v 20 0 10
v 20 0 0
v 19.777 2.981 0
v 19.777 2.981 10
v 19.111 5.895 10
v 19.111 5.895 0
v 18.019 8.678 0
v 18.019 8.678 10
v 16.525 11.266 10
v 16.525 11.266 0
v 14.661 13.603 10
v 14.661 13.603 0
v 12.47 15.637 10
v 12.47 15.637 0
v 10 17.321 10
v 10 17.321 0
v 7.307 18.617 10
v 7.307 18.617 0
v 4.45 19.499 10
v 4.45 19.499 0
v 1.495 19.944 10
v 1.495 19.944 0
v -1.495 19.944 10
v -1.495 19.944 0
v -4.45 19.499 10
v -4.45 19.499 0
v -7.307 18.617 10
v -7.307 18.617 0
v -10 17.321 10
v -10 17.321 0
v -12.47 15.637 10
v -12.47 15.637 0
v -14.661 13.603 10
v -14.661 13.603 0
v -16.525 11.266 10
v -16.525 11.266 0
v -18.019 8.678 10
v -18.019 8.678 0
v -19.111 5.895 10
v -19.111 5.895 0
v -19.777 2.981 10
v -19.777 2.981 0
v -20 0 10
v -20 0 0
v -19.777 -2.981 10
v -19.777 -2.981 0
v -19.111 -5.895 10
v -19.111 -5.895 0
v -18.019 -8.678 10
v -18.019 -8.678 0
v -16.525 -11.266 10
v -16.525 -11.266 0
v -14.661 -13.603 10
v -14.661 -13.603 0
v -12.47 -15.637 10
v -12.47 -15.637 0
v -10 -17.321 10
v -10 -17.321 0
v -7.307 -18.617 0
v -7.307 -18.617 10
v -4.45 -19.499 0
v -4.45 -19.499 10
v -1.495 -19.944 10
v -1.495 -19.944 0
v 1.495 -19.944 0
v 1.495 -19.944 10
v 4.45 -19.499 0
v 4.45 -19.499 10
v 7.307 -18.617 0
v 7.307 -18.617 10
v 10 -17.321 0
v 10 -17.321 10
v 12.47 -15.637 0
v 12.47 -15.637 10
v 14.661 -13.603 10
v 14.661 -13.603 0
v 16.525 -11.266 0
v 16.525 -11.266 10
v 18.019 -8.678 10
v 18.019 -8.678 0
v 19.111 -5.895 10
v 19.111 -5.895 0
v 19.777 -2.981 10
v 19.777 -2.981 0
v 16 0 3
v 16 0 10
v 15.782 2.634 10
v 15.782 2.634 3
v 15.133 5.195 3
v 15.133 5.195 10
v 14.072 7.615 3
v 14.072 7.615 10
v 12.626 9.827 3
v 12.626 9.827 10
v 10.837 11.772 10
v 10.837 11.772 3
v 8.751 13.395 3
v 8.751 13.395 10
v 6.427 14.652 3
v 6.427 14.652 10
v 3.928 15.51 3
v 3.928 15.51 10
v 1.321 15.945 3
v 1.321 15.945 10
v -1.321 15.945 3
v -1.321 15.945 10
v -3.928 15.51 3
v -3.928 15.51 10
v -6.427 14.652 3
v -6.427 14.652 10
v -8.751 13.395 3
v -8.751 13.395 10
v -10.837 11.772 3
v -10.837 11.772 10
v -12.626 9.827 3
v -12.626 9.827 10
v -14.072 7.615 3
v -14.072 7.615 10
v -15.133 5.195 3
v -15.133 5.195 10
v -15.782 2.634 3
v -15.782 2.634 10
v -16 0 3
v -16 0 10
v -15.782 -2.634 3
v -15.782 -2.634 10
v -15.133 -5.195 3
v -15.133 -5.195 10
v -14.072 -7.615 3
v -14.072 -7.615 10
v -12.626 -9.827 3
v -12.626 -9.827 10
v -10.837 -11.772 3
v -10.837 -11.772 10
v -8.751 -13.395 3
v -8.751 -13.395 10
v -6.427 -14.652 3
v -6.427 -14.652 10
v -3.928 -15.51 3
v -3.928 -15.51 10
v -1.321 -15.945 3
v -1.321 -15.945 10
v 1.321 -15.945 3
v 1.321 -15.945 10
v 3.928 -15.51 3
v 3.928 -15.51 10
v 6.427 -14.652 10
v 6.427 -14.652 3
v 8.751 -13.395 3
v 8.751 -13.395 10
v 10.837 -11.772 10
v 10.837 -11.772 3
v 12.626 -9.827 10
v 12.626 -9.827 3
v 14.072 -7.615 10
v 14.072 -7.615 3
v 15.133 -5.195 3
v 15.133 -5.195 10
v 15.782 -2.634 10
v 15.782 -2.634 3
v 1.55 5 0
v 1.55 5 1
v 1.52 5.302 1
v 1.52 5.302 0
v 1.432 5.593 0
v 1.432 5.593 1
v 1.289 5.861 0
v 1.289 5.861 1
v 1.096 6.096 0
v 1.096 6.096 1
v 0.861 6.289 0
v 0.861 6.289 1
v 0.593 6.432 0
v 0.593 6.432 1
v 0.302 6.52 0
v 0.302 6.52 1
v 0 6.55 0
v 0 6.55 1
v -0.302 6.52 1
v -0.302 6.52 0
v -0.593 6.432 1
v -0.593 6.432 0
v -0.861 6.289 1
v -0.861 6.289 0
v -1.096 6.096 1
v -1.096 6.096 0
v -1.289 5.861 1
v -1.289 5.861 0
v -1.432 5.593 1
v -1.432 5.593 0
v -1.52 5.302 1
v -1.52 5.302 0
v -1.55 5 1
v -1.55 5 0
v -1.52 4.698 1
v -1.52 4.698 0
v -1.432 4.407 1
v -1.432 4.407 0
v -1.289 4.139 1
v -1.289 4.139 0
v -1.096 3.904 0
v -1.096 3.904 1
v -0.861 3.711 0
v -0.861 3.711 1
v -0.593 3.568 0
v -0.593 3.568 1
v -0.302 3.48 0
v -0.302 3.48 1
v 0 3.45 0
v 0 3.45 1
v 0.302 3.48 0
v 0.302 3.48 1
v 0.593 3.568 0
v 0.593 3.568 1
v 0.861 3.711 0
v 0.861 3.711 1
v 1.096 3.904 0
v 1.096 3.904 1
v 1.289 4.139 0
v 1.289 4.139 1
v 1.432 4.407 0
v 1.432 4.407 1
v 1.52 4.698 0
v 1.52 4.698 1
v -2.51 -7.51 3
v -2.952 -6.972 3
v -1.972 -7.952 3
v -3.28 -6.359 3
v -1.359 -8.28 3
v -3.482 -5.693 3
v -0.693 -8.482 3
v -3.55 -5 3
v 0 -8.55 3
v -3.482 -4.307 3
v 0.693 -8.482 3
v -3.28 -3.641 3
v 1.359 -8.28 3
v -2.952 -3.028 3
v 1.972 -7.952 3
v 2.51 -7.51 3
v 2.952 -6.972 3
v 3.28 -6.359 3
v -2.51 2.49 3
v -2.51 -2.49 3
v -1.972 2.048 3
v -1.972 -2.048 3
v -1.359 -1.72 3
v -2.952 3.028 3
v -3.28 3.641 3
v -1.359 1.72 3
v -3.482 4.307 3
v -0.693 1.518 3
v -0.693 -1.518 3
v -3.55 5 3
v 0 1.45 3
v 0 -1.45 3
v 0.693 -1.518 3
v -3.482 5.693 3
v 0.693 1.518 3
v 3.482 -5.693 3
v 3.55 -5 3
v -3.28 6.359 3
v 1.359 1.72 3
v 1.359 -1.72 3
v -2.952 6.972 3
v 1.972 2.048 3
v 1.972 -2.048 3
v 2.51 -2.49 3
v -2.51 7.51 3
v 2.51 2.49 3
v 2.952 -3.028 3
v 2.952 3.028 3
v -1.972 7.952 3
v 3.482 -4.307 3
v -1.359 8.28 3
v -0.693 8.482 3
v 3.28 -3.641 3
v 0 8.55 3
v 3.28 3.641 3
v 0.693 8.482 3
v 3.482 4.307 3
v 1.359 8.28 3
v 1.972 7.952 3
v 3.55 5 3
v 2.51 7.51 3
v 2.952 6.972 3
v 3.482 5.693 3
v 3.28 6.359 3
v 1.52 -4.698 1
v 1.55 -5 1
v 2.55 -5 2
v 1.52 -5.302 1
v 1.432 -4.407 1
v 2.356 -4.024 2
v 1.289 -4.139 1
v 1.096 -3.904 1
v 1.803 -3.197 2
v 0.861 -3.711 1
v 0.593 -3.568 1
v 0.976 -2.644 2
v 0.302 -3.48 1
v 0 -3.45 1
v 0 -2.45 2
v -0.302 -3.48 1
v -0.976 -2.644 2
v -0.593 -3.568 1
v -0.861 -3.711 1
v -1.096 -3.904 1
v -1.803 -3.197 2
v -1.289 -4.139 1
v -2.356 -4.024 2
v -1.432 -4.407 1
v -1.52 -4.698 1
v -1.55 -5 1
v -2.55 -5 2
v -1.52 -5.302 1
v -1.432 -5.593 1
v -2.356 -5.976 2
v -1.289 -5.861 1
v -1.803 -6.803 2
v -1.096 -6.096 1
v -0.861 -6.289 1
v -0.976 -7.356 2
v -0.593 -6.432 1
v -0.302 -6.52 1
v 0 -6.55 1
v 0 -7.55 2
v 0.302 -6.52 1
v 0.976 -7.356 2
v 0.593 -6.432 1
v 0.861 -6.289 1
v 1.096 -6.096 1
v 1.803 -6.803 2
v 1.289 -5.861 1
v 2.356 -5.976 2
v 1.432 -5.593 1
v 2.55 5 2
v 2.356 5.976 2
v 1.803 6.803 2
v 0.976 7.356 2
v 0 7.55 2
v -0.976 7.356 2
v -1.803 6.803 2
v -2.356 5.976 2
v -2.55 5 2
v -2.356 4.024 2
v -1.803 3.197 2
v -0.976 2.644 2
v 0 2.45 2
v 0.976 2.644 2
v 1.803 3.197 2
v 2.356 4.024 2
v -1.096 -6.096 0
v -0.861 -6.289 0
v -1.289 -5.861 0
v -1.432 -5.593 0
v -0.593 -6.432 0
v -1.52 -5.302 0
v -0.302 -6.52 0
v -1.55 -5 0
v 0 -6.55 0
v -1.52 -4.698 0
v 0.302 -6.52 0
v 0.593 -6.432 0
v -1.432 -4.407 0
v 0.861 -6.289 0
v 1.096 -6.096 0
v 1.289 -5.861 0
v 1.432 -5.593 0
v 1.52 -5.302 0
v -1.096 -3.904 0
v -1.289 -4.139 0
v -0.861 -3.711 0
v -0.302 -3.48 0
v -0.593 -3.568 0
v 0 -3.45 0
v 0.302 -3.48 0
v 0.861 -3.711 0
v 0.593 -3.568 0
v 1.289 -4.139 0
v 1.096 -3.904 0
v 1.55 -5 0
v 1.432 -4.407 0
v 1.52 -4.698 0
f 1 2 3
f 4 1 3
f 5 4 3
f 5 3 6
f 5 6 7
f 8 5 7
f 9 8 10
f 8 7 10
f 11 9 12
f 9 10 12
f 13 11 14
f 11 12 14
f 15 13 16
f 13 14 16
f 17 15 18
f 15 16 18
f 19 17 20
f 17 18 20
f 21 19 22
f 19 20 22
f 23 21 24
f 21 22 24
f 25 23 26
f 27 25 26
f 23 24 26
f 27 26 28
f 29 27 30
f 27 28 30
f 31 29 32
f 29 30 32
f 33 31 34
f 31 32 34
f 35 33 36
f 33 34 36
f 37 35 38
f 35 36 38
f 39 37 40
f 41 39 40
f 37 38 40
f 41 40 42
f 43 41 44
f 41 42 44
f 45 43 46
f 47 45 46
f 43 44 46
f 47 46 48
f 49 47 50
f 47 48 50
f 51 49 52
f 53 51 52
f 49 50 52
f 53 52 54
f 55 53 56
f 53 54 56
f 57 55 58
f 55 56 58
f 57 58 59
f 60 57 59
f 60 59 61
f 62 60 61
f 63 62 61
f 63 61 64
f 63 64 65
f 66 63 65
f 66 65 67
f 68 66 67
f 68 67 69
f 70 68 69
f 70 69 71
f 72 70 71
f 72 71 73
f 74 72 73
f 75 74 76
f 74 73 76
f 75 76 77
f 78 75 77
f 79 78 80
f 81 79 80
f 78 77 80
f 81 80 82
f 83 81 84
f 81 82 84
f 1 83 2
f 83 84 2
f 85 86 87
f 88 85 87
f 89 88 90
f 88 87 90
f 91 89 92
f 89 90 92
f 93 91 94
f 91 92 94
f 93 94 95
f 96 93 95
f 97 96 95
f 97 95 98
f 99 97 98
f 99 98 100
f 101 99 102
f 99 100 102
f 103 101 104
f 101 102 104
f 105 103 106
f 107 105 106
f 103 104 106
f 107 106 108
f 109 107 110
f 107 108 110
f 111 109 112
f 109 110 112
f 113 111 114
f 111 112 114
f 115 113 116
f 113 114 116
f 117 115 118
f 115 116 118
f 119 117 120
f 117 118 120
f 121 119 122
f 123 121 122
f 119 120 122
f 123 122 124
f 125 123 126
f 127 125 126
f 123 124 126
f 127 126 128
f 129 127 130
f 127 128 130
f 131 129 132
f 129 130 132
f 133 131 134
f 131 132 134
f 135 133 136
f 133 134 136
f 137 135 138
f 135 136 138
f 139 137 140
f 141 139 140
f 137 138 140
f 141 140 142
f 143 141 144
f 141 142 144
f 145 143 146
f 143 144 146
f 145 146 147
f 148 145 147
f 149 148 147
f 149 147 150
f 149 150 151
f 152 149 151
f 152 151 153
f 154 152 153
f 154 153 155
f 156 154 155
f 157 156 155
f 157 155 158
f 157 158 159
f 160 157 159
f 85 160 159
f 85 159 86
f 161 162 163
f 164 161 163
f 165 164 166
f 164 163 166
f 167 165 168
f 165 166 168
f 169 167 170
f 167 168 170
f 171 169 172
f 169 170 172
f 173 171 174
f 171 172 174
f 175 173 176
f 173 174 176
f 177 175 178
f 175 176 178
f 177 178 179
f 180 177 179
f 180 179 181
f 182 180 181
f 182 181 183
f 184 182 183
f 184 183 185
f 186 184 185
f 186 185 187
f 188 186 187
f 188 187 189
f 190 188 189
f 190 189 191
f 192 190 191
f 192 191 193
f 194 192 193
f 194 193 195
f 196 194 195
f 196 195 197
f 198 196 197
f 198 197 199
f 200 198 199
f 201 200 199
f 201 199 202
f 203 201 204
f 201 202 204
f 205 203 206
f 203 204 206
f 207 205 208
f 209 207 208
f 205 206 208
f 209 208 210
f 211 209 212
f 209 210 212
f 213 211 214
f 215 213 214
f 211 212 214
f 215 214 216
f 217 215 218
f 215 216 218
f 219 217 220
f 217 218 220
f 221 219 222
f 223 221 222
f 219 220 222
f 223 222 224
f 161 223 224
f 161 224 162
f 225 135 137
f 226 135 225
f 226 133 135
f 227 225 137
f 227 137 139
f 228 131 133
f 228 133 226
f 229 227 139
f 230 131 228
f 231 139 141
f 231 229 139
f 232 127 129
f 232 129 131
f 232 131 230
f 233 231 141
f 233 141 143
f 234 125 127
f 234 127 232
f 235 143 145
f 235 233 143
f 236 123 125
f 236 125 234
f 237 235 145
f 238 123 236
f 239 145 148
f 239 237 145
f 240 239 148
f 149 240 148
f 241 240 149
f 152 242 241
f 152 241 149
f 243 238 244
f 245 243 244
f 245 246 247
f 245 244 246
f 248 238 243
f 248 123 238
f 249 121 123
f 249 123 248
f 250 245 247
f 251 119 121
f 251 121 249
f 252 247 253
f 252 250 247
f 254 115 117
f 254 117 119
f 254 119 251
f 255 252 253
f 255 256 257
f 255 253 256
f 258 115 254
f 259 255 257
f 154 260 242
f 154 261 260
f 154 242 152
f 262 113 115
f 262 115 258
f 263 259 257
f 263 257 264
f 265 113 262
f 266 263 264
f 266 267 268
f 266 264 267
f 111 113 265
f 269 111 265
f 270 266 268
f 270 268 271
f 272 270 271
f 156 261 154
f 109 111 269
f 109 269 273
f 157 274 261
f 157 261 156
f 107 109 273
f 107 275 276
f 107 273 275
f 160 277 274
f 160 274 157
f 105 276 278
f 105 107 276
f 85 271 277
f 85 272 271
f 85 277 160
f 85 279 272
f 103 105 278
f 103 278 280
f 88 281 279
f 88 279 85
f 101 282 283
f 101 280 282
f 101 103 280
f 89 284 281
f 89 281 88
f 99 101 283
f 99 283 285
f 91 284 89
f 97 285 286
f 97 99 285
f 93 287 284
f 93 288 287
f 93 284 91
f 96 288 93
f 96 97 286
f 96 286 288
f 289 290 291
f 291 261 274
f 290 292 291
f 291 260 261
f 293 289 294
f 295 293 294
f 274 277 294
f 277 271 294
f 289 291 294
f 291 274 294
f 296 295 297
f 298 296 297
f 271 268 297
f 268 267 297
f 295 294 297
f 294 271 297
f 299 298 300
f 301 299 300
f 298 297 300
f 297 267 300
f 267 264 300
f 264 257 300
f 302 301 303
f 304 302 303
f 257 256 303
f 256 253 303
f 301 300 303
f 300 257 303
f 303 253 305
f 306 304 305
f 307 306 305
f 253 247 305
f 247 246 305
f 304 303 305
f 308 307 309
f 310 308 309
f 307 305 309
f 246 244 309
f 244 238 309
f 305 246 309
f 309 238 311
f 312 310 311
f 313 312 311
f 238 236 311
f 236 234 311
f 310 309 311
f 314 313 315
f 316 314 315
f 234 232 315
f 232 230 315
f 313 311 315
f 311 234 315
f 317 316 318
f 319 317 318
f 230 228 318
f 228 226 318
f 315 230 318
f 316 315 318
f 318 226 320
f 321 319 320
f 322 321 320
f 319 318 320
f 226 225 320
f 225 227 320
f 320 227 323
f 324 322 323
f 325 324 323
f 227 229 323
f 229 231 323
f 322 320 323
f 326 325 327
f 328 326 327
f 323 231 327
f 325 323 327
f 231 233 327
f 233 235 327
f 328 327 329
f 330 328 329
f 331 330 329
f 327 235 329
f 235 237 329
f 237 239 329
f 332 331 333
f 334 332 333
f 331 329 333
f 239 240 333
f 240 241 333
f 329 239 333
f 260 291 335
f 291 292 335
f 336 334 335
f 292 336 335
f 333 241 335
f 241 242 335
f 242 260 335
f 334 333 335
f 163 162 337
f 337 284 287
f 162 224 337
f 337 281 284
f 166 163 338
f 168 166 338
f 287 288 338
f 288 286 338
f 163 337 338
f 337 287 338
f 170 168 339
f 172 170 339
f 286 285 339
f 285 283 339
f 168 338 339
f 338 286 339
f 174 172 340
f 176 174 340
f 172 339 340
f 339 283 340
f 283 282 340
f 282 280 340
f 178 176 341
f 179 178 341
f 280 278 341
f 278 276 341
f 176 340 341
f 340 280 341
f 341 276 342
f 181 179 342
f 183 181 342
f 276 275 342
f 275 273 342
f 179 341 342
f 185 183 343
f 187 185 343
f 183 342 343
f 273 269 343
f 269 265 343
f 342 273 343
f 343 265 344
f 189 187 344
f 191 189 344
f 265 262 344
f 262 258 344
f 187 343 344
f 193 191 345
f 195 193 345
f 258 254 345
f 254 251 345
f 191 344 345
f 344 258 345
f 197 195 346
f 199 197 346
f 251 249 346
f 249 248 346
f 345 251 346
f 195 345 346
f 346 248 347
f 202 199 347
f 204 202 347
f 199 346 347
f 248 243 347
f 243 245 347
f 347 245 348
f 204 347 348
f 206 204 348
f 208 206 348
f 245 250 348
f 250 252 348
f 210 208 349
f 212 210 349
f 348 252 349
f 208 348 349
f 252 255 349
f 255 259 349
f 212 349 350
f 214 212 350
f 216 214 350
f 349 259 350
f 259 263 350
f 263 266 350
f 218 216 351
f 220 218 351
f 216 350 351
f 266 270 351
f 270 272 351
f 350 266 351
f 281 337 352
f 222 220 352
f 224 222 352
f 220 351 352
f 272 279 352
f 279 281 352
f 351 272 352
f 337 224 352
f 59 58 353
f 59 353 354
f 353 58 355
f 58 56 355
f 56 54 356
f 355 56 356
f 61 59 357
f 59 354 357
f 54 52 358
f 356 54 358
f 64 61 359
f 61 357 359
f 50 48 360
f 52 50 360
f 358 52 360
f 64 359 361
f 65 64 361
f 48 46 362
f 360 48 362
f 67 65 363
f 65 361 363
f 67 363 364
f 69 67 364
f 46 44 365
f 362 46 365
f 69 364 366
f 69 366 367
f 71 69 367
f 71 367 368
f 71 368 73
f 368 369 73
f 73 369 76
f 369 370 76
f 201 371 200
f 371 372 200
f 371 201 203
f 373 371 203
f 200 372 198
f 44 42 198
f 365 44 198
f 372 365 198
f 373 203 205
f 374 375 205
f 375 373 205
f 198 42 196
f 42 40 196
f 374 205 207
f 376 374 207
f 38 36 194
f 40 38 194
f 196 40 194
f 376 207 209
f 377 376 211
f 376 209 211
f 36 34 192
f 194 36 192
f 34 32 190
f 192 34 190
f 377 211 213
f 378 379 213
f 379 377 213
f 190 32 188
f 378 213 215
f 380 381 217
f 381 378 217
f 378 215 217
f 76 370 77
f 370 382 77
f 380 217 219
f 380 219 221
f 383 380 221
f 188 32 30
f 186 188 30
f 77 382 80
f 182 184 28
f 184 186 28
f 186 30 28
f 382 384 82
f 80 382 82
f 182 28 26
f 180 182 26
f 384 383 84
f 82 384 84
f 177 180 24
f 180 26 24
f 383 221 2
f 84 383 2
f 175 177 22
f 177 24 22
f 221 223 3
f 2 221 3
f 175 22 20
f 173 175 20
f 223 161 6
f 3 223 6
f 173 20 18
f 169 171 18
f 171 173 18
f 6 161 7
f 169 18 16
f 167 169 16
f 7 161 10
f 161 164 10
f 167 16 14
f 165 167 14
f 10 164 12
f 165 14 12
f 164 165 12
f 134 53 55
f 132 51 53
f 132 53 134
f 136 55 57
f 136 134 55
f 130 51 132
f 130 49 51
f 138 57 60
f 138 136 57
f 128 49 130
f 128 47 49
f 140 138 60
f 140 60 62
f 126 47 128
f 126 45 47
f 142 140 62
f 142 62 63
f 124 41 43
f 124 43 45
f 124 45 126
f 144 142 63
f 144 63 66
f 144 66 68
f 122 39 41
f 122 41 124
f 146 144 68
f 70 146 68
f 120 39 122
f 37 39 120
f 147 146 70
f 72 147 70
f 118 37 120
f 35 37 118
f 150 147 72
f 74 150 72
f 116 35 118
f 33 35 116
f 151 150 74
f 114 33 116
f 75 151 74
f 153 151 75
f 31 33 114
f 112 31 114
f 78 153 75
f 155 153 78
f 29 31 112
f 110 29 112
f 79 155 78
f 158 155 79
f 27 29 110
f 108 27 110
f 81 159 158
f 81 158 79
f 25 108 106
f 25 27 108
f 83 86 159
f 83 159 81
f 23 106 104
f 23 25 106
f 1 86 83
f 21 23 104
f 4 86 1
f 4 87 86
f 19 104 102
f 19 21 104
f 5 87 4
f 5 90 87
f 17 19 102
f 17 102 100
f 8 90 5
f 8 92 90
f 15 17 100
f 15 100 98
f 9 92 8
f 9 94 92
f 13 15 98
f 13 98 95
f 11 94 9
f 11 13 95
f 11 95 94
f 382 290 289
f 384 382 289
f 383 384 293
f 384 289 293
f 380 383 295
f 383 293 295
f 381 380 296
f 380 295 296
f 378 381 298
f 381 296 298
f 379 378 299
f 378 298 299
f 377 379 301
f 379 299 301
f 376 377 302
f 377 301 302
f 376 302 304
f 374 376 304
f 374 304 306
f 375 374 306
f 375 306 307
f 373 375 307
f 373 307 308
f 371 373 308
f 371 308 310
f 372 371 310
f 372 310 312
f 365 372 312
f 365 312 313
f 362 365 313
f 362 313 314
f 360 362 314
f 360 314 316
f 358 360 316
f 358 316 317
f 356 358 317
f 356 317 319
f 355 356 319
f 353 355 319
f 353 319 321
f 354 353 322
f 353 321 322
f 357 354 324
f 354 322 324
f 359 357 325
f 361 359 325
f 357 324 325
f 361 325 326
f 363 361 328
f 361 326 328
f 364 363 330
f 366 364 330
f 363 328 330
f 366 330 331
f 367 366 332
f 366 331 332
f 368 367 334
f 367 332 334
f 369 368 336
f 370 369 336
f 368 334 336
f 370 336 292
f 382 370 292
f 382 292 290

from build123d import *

# Parameters (mm, degrees)
SKETCH1_R           = 20
BOSS_EXTRUDE1_DEPTH = 10
SKETCH2_R           = 16
CUT_EXTRUDE1_DEPTH  = 7
SKETCH3_R           = 1.55
CUT_EXTRUDE2_DEPTH  = 4
CHAMFER1_SIZE       = 2


with BuildPart() as part:
    # Sketch1 → Boss-Extrude1 (new body)
    with BuildSketch(Plane.XY):
        Circle(SKETCH1_R)
    extrude(amount=BOSS_EXTRUDE1_DEPTH)

    # Sketch2 → Cut-Extrude1 (cut)
    with BuildSketch(Plane.XY.offset(10)):
        Circle(SKETCH2_R)
    extrude(amount=-CUT_EXTRUDE1_DEPTH, mode=Mode.SUBTRACT)

    # Sketch3 → Cut-Extrude2 (cut, through all)
    with BuildSketch(Plane.XY.offset(3)):
        with Locations((0, -5)):
            Circle(SKETCH3_R)
        with Locations((0, 5)):
            Circle(SKETCH3_R)
    extrude(amount=-CUT_EXTRUDE2_DEPTH, mode=Mode.SUBTRACT)

    # Chamfer1
    chamfer1_edges = [part.edges().sort_by_distance(p)[0] for p in [
        (-1.55, -5, 3),
        (-1.55, 5, 3),
    ]]
    chamfer(chamfer1_edges, length=CHAMFER1_SIZE)


solid = part.part
